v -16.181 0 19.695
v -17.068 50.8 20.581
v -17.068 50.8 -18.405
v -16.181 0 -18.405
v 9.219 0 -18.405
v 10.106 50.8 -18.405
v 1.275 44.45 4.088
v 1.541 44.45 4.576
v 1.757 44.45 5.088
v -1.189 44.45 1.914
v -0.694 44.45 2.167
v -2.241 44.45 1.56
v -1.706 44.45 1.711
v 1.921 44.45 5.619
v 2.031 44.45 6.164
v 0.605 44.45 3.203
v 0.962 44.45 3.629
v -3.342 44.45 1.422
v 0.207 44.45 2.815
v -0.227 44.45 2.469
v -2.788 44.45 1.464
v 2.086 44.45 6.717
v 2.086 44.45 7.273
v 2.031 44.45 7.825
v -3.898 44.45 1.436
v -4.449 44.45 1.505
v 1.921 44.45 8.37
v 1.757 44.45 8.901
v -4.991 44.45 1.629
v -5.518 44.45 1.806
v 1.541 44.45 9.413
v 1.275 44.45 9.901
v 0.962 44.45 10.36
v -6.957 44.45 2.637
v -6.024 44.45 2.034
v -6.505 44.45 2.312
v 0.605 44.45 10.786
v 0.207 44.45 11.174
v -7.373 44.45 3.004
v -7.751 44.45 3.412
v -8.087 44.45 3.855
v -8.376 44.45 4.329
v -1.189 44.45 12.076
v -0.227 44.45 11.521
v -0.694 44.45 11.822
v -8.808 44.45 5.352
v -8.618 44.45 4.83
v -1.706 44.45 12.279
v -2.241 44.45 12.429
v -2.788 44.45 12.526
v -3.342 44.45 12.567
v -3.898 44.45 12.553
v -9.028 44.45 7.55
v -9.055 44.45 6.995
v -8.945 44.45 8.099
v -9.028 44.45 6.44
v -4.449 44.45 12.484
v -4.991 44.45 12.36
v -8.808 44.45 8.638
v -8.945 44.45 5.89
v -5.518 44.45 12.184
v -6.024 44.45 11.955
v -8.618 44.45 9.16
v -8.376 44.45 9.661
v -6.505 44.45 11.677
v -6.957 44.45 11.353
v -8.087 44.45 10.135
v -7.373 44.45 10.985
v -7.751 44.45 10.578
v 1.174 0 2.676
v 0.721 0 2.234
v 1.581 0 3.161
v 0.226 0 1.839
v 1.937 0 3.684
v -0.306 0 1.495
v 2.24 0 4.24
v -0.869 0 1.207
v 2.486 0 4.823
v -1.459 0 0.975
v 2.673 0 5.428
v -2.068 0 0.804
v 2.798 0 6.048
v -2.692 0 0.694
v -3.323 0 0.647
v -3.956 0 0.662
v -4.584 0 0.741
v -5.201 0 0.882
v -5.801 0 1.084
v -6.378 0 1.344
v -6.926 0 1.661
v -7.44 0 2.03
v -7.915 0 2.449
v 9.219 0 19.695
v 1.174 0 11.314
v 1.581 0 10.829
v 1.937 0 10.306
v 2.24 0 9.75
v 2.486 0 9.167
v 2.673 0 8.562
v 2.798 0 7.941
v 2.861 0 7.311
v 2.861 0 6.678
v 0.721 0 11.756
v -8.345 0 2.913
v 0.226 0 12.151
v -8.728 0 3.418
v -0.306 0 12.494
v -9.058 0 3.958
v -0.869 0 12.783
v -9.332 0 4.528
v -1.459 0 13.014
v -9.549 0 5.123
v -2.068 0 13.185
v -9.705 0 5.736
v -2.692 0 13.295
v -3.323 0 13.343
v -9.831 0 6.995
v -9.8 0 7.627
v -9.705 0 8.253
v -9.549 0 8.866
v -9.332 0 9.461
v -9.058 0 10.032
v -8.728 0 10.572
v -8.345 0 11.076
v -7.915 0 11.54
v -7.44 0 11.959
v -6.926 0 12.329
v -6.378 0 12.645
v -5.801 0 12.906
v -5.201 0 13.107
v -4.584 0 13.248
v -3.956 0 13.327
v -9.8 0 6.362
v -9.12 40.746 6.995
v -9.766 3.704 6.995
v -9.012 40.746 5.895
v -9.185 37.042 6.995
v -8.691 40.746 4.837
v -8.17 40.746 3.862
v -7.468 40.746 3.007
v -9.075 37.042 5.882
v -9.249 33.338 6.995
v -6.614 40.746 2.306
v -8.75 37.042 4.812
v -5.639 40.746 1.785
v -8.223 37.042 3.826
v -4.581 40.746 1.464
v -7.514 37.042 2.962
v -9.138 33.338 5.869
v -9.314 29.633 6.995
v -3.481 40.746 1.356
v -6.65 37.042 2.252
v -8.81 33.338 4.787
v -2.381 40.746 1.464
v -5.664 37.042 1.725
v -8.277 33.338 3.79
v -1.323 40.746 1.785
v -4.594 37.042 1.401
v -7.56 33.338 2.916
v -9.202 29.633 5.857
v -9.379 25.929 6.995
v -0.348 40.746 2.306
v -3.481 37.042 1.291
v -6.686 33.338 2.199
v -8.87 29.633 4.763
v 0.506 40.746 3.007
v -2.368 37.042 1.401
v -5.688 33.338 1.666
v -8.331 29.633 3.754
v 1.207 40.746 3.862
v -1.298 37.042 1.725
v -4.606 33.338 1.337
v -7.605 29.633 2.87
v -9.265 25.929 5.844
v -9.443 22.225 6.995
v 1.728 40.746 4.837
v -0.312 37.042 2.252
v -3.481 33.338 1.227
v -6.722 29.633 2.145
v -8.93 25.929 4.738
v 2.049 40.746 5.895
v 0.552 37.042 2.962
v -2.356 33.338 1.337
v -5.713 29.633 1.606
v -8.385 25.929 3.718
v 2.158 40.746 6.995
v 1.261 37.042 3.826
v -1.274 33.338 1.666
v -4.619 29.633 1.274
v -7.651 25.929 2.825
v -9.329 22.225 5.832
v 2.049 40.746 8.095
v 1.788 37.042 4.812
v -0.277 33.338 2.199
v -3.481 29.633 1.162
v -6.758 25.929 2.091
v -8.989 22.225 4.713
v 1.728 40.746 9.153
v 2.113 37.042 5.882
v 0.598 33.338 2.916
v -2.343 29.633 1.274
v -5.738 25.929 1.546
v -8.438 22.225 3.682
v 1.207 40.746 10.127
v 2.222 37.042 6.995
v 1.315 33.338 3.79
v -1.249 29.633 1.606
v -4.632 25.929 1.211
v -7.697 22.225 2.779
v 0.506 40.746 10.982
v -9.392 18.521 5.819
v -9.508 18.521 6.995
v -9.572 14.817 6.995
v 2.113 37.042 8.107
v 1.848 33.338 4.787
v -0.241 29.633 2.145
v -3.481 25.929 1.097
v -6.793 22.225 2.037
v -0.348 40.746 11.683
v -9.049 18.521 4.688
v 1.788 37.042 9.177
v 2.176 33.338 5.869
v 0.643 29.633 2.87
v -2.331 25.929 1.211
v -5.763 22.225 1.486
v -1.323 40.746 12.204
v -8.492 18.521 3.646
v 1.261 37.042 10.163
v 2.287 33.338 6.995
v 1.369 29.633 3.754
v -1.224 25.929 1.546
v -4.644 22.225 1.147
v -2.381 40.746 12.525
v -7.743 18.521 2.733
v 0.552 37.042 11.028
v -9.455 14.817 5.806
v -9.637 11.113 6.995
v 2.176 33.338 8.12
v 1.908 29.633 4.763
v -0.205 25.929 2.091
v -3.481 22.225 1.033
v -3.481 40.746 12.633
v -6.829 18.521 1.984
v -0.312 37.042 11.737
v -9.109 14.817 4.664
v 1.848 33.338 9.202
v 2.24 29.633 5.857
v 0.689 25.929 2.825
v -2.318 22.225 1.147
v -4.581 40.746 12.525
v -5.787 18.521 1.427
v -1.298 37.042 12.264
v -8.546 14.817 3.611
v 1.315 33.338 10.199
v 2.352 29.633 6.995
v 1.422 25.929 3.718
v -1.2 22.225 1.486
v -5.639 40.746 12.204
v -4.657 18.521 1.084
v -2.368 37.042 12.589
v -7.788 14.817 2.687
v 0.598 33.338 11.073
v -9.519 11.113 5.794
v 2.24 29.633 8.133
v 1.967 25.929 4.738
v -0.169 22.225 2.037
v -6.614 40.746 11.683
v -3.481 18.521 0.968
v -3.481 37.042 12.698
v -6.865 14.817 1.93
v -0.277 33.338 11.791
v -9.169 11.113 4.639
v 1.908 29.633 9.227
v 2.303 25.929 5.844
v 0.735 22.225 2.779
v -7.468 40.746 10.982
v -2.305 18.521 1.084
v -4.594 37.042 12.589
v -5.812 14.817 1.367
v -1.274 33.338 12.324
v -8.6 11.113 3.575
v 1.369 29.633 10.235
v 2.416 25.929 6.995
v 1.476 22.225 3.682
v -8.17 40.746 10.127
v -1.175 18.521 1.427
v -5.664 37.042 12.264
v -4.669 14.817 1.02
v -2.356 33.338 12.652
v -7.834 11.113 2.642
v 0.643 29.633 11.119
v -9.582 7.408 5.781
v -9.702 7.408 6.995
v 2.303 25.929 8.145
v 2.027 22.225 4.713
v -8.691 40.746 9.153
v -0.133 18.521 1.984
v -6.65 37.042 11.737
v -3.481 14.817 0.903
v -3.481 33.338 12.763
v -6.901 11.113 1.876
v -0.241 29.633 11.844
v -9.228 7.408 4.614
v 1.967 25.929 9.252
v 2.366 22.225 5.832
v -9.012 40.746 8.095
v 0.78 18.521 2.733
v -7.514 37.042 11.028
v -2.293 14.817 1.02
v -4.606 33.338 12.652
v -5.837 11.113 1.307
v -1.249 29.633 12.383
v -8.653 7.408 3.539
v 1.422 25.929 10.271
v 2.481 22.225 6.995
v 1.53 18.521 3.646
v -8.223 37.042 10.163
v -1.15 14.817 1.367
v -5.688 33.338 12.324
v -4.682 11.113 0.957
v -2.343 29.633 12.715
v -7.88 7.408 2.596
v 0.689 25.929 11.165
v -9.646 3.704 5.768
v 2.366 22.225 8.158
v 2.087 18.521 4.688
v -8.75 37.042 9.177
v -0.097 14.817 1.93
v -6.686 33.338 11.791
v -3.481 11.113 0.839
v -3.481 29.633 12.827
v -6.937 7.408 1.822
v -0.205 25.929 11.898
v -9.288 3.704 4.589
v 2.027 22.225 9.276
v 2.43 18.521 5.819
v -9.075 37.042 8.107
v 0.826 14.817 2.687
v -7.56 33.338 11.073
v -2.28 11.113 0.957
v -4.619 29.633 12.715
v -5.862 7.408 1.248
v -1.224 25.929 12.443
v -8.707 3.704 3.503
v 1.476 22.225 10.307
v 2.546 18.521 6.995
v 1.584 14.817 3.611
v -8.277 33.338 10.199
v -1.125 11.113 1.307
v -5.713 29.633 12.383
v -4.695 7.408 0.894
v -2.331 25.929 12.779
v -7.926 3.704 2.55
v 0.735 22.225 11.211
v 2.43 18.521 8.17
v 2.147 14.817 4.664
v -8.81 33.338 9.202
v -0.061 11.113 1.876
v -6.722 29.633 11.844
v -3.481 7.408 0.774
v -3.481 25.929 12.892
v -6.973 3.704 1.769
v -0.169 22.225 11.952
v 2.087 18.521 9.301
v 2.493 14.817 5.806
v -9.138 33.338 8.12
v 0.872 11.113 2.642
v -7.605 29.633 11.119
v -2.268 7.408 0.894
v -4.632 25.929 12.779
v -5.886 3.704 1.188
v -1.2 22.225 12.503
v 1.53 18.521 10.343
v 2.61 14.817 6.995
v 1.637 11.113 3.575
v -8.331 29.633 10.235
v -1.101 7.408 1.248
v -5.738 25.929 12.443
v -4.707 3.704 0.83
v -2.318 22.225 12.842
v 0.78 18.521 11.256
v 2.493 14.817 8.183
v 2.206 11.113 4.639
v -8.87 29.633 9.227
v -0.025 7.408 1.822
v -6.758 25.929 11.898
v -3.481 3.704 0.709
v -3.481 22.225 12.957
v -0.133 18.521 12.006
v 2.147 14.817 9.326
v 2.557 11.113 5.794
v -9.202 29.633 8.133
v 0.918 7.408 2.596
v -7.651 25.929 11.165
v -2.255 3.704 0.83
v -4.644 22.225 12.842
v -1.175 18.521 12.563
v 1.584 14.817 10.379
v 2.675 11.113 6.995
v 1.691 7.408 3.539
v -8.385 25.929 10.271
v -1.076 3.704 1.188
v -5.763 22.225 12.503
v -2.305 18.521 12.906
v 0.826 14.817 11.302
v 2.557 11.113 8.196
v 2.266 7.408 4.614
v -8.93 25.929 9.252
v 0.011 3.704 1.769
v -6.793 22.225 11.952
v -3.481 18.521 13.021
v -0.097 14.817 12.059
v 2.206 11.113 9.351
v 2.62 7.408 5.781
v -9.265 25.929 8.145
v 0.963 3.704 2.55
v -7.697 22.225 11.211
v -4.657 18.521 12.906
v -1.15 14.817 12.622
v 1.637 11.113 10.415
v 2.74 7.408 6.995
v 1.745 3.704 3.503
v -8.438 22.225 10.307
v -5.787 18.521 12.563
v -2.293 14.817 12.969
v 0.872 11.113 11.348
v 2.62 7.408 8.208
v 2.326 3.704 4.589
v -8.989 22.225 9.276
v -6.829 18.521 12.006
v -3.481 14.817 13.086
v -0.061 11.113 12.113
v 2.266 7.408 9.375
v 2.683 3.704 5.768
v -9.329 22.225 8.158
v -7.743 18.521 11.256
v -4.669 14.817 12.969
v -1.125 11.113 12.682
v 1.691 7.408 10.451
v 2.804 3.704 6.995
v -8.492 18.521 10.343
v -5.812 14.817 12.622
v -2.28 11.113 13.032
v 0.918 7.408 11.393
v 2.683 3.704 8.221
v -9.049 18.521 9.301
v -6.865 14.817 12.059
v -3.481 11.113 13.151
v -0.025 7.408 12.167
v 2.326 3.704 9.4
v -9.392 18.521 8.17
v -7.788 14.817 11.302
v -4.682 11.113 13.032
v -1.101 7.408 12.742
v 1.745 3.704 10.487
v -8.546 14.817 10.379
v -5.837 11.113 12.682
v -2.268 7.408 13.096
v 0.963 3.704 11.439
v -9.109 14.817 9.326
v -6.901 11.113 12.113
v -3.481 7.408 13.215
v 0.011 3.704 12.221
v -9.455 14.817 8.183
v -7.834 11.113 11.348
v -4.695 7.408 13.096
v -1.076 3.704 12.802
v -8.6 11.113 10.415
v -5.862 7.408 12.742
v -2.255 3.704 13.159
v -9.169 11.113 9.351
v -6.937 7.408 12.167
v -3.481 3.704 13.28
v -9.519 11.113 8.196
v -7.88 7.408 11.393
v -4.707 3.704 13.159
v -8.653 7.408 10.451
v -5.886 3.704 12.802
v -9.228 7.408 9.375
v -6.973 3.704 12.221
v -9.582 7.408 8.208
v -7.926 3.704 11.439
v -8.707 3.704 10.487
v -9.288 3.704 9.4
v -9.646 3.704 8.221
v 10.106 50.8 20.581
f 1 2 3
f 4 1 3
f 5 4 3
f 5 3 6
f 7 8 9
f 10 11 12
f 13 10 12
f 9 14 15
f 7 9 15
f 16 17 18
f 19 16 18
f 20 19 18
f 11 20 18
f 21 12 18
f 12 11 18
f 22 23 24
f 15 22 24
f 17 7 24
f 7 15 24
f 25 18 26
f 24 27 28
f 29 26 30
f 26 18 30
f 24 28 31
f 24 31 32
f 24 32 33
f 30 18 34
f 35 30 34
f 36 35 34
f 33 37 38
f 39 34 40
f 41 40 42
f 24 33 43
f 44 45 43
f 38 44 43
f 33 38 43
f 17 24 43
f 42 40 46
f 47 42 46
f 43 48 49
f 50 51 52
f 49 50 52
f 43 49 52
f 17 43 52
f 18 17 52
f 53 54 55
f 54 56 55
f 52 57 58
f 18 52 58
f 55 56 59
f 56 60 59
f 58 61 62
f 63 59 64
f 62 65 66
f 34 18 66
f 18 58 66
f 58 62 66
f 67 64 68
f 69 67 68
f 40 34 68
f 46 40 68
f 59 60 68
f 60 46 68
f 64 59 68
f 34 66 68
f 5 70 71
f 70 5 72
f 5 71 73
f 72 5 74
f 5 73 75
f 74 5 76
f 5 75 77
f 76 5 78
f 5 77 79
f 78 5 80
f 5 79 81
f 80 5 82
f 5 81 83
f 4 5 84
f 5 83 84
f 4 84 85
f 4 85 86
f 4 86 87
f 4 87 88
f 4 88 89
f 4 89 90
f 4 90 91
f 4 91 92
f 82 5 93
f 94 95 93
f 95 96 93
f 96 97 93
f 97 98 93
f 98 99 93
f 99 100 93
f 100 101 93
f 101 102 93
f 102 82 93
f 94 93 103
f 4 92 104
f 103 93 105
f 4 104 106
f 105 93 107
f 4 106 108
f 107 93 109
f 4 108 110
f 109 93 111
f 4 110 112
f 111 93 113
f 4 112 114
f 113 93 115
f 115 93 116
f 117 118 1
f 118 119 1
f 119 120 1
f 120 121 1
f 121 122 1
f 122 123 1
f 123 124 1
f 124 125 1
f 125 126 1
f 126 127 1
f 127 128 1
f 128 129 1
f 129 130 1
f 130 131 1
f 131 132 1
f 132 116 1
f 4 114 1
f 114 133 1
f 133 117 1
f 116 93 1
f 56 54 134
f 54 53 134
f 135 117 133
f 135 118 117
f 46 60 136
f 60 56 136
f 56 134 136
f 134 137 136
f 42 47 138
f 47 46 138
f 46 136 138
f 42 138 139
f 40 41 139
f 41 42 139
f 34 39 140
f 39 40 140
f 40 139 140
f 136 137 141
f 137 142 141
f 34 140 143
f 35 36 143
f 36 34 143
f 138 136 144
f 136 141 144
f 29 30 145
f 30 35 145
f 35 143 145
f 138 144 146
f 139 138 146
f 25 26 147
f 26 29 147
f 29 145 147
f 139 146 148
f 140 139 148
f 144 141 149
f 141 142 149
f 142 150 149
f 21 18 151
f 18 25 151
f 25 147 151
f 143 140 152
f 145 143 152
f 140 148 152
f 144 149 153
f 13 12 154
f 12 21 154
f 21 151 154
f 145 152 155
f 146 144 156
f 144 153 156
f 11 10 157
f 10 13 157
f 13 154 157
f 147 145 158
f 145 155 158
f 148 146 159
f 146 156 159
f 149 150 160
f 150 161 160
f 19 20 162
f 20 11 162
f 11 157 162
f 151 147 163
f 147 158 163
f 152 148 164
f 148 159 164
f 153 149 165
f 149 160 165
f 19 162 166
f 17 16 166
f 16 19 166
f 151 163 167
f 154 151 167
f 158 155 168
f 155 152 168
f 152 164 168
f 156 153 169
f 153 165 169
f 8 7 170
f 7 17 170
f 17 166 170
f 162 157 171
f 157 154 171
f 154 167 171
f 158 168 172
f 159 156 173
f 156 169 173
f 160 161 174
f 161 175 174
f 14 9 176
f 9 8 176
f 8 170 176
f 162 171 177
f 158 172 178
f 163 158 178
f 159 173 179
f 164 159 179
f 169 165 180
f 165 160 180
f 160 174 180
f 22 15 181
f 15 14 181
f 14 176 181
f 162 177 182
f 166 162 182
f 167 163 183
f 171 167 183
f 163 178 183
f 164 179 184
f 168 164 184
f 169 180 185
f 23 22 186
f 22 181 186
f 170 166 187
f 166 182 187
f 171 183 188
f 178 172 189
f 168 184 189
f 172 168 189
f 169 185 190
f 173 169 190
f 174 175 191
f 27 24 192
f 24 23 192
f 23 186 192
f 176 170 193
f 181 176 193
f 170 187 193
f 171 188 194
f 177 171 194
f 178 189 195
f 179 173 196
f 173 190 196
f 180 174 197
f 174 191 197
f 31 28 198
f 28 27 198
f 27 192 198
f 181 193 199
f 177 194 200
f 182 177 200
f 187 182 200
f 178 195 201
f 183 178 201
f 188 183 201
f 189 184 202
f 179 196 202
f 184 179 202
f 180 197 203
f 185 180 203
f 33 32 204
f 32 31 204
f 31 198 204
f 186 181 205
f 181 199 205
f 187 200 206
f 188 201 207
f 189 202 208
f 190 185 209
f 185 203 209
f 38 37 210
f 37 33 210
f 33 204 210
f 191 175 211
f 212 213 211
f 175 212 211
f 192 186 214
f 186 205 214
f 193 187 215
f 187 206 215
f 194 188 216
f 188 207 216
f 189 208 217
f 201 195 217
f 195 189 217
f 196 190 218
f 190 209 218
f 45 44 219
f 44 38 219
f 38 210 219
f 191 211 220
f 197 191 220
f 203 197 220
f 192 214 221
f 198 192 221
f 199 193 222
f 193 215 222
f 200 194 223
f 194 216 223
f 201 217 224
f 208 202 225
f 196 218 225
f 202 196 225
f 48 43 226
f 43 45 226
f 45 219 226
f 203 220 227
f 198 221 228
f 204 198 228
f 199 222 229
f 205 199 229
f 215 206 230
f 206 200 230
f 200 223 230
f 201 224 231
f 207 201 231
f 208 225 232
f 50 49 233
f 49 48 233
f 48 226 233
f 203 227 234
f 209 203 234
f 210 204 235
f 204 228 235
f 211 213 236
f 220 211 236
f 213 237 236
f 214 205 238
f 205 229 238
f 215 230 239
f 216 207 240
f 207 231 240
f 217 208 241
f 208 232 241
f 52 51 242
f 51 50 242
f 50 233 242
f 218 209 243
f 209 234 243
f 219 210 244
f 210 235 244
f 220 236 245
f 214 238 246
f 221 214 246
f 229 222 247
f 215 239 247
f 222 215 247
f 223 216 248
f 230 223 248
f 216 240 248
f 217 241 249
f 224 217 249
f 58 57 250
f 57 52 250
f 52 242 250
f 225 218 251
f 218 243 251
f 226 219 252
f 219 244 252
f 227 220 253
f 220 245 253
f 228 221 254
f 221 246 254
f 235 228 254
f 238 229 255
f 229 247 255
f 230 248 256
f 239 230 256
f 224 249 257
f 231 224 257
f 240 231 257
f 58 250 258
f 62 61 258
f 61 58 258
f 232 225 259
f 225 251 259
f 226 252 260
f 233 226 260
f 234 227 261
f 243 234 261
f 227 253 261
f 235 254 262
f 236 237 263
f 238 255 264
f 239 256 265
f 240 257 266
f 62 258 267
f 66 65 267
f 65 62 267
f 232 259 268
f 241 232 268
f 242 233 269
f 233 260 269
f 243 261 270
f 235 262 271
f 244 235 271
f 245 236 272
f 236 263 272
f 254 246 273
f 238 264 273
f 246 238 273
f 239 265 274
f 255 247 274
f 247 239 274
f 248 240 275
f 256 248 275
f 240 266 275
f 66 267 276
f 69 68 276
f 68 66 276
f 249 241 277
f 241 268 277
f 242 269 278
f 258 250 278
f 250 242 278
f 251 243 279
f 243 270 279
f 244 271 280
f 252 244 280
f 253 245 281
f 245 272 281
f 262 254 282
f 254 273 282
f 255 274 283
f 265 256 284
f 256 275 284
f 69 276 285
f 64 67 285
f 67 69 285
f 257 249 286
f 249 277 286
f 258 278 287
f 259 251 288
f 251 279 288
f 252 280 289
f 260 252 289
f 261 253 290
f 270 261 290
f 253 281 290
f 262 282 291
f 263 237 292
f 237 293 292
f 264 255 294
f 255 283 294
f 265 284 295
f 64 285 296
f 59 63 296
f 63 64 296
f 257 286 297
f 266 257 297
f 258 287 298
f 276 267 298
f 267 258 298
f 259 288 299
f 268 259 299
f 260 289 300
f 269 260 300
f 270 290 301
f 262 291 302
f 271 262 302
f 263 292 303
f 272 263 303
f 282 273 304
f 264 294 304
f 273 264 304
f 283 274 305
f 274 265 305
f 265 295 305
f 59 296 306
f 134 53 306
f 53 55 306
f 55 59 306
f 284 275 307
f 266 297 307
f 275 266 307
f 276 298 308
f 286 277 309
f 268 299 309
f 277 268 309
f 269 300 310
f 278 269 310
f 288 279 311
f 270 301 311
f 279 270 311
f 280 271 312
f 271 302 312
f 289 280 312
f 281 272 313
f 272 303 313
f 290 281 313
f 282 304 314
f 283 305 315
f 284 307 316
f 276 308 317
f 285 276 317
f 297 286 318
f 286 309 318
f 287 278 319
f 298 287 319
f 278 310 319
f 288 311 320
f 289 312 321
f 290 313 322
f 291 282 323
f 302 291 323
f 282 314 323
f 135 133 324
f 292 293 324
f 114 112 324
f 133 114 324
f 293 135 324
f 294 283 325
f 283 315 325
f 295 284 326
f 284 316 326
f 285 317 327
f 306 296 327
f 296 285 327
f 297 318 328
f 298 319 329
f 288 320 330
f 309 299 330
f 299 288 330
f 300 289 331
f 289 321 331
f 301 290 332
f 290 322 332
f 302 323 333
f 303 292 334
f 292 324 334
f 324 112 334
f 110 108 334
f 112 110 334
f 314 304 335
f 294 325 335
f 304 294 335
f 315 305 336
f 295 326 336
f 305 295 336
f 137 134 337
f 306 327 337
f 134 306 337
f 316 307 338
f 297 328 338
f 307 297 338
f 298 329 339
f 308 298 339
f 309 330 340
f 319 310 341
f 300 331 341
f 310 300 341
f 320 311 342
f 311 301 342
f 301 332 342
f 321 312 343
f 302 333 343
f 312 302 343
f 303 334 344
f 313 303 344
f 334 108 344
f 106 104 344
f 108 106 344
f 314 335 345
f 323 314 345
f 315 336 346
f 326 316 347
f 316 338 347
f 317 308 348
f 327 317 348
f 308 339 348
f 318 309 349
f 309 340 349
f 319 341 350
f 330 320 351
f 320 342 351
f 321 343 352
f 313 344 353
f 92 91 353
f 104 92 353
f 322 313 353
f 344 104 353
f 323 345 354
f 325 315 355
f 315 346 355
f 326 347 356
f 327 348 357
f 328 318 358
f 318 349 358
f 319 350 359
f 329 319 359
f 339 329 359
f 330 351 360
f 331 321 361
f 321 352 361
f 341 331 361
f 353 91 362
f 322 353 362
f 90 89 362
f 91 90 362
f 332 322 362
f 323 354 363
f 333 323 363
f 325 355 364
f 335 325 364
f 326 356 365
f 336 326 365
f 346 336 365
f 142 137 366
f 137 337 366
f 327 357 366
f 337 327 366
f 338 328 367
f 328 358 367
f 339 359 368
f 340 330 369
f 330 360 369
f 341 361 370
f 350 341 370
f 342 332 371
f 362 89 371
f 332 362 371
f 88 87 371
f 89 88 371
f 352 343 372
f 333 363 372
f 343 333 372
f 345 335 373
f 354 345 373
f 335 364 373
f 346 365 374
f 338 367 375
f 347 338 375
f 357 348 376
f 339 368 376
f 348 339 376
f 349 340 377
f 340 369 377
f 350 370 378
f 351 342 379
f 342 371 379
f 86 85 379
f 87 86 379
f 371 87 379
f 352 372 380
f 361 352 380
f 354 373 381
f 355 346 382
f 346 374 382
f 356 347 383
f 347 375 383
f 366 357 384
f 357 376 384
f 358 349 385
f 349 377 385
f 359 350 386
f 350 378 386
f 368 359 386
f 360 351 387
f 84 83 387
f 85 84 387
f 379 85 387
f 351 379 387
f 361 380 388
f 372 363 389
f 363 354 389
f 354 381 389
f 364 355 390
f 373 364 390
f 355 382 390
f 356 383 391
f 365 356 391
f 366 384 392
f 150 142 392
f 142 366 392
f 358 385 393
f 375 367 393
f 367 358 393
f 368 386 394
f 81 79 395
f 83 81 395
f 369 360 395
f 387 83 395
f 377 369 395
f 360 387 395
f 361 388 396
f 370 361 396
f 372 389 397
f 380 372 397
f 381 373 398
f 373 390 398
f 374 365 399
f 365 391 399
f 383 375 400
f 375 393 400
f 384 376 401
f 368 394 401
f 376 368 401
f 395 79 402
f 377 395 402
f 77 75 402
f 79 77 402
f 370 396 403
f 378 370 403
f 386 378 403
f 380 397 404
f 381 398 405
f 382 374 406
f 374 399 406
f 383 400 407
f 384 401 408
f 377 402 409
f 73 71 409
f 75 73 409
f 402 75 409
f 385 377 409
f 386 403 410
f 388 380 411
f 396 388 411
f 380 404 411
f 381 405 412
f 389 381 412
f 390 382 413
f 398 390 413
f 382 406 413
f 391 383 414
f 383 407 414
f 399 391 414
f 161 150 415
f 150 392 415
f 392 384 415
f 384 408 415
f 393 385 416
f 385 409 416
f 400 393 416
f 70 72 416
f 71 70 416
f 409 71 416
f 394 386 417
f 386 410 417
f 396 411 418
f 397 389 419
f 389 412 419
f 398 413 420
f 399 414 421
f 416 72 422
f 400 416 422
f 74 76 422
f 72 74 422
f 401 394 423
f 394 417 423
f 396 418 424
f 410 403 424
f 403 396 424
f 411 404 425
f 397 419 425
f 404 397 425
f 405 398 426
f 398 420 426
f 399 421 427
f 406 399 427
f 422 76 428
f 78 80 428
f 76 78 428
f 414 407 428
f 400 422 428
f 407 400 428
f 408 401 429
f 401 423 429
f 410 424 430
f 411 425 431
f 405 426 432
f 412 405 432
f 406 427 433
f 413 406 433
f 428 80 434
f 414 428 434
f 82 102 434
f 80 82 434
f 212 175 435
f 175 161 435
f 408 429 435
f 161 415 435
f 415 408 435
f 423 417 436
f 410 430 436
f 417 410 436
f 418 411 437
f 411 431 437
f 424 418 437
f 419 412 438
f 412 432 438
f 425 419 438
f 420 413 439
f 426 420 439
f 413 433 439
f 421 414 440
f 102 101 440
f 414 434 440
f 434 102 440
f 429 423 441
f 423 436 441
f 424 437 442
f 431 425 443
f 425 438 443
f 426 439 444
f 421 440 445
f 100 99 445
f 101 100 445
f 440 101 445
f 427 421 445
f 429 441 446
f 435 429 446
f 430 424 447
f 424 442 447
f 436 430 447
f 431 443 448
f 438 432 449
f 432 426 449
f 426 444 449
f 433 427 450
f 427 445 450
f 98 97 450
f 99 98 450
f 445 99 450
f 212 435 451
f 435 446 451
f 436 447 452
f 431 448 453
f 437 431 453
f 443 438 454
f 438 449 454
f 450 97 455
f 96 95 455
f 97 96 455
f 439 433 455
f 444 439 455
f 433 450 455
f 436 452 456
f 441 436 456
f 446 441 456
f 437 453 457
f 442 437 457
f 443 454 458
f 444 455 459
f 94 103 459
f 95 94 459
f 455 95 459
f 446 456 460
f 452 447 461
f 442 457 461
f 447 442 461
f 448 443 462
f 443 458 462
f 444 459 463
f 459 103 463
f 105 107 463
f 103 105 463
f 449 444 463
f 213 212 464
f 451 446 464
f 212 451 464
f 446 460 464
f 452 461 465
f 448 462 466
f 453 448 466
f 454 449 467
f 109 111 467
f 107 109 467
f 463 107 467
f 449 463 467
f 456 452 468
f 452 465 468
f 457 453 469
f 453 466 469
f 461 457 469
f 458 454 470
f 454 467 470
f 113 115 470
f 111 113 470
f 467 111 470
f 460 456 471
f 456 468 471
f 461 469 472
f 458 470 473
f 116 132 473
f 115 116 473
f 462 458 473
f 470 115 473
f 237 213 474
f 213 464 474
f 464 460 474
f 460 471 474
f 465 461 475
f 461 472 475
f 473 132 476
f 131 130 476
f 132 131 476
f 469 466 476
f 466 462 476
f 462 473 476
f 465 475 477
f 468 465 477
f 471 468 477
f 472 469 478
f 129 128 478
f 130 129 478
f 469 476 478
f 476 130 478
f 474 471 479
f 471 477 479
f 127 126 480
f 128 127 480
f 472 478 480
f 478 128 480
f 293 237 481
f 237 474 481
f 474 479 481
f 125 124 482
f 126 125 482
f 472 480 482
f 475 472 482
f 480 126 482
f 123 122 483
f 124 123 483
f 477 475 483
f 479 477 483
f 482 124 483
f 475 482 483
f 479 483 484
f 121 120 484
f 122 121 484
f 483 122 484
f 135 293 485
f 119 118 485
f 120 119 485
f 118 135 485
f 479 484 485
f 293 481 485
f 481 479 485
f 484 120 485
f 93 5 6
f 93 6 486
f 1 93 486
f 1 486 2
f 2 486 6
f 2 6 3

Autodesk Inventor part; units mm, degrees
ref_plane "YZ Plane" through (0, 0, 0) normal (1, 0, 0) x (0, 1, 0)
ref_plane "XZ Plane" through (0, 0, 0) normal (0, 1, 0) x (-1, 0, 0)
ref_plane "XY Plane" through (0, 0, 0) normal (0, 0, 1) x (1, 0, 0)
sketch "Sketch1" plane through (0, 0, 0) normal (0, 1, 0) x (-1, 0, 0)
  circle A0 centre (3.4811, 6.9947) radius 6.35
  line L0 (-9.2189, 19.6947) -> (16.1811, 19.6947)
  line L1 (16.1811, 19.6947) -> (16.1811, -18.4053)
  line L2 (16.1811, -18.4053) -> (-9.2189, -18.4053)
  line L3 (-9.2189, -18.4053) -> (-9.2189, 19.6947)
  point P0 (0, 0)
  dimension "d0" = 12.7
  dimension "d1" = 25.4
  dimension "d2" = 38.1
  dimension "d3" = 12.7
  dimension "d4" = 12.7
extrude "Extrusion1" add sketch "Sketch1" along normal blind 50.8 contours A0 | L0 L1 L2 L3
extrude "Extrusion2" cut sketch "Sketch1" along normal blind 44.45 contours A0
draft "FaceDraft1" angle 1 pull direction (0, -1, 0) faces at (9.2189, 16.9333, 6.9947) (-16.1811, 16.9333, -5.7053) (-7.7145, 33.8667, 19.6947) (-9.7489, 29.6333, 5.9761) fixed edges at (9.2189, 0, 0.6447) (-16.1811, 0, 0.6447) (-3.4811, 0, 19.6947) (2.8689, 0, 6.9947)
properties part number "Cylinder Cast Image"
